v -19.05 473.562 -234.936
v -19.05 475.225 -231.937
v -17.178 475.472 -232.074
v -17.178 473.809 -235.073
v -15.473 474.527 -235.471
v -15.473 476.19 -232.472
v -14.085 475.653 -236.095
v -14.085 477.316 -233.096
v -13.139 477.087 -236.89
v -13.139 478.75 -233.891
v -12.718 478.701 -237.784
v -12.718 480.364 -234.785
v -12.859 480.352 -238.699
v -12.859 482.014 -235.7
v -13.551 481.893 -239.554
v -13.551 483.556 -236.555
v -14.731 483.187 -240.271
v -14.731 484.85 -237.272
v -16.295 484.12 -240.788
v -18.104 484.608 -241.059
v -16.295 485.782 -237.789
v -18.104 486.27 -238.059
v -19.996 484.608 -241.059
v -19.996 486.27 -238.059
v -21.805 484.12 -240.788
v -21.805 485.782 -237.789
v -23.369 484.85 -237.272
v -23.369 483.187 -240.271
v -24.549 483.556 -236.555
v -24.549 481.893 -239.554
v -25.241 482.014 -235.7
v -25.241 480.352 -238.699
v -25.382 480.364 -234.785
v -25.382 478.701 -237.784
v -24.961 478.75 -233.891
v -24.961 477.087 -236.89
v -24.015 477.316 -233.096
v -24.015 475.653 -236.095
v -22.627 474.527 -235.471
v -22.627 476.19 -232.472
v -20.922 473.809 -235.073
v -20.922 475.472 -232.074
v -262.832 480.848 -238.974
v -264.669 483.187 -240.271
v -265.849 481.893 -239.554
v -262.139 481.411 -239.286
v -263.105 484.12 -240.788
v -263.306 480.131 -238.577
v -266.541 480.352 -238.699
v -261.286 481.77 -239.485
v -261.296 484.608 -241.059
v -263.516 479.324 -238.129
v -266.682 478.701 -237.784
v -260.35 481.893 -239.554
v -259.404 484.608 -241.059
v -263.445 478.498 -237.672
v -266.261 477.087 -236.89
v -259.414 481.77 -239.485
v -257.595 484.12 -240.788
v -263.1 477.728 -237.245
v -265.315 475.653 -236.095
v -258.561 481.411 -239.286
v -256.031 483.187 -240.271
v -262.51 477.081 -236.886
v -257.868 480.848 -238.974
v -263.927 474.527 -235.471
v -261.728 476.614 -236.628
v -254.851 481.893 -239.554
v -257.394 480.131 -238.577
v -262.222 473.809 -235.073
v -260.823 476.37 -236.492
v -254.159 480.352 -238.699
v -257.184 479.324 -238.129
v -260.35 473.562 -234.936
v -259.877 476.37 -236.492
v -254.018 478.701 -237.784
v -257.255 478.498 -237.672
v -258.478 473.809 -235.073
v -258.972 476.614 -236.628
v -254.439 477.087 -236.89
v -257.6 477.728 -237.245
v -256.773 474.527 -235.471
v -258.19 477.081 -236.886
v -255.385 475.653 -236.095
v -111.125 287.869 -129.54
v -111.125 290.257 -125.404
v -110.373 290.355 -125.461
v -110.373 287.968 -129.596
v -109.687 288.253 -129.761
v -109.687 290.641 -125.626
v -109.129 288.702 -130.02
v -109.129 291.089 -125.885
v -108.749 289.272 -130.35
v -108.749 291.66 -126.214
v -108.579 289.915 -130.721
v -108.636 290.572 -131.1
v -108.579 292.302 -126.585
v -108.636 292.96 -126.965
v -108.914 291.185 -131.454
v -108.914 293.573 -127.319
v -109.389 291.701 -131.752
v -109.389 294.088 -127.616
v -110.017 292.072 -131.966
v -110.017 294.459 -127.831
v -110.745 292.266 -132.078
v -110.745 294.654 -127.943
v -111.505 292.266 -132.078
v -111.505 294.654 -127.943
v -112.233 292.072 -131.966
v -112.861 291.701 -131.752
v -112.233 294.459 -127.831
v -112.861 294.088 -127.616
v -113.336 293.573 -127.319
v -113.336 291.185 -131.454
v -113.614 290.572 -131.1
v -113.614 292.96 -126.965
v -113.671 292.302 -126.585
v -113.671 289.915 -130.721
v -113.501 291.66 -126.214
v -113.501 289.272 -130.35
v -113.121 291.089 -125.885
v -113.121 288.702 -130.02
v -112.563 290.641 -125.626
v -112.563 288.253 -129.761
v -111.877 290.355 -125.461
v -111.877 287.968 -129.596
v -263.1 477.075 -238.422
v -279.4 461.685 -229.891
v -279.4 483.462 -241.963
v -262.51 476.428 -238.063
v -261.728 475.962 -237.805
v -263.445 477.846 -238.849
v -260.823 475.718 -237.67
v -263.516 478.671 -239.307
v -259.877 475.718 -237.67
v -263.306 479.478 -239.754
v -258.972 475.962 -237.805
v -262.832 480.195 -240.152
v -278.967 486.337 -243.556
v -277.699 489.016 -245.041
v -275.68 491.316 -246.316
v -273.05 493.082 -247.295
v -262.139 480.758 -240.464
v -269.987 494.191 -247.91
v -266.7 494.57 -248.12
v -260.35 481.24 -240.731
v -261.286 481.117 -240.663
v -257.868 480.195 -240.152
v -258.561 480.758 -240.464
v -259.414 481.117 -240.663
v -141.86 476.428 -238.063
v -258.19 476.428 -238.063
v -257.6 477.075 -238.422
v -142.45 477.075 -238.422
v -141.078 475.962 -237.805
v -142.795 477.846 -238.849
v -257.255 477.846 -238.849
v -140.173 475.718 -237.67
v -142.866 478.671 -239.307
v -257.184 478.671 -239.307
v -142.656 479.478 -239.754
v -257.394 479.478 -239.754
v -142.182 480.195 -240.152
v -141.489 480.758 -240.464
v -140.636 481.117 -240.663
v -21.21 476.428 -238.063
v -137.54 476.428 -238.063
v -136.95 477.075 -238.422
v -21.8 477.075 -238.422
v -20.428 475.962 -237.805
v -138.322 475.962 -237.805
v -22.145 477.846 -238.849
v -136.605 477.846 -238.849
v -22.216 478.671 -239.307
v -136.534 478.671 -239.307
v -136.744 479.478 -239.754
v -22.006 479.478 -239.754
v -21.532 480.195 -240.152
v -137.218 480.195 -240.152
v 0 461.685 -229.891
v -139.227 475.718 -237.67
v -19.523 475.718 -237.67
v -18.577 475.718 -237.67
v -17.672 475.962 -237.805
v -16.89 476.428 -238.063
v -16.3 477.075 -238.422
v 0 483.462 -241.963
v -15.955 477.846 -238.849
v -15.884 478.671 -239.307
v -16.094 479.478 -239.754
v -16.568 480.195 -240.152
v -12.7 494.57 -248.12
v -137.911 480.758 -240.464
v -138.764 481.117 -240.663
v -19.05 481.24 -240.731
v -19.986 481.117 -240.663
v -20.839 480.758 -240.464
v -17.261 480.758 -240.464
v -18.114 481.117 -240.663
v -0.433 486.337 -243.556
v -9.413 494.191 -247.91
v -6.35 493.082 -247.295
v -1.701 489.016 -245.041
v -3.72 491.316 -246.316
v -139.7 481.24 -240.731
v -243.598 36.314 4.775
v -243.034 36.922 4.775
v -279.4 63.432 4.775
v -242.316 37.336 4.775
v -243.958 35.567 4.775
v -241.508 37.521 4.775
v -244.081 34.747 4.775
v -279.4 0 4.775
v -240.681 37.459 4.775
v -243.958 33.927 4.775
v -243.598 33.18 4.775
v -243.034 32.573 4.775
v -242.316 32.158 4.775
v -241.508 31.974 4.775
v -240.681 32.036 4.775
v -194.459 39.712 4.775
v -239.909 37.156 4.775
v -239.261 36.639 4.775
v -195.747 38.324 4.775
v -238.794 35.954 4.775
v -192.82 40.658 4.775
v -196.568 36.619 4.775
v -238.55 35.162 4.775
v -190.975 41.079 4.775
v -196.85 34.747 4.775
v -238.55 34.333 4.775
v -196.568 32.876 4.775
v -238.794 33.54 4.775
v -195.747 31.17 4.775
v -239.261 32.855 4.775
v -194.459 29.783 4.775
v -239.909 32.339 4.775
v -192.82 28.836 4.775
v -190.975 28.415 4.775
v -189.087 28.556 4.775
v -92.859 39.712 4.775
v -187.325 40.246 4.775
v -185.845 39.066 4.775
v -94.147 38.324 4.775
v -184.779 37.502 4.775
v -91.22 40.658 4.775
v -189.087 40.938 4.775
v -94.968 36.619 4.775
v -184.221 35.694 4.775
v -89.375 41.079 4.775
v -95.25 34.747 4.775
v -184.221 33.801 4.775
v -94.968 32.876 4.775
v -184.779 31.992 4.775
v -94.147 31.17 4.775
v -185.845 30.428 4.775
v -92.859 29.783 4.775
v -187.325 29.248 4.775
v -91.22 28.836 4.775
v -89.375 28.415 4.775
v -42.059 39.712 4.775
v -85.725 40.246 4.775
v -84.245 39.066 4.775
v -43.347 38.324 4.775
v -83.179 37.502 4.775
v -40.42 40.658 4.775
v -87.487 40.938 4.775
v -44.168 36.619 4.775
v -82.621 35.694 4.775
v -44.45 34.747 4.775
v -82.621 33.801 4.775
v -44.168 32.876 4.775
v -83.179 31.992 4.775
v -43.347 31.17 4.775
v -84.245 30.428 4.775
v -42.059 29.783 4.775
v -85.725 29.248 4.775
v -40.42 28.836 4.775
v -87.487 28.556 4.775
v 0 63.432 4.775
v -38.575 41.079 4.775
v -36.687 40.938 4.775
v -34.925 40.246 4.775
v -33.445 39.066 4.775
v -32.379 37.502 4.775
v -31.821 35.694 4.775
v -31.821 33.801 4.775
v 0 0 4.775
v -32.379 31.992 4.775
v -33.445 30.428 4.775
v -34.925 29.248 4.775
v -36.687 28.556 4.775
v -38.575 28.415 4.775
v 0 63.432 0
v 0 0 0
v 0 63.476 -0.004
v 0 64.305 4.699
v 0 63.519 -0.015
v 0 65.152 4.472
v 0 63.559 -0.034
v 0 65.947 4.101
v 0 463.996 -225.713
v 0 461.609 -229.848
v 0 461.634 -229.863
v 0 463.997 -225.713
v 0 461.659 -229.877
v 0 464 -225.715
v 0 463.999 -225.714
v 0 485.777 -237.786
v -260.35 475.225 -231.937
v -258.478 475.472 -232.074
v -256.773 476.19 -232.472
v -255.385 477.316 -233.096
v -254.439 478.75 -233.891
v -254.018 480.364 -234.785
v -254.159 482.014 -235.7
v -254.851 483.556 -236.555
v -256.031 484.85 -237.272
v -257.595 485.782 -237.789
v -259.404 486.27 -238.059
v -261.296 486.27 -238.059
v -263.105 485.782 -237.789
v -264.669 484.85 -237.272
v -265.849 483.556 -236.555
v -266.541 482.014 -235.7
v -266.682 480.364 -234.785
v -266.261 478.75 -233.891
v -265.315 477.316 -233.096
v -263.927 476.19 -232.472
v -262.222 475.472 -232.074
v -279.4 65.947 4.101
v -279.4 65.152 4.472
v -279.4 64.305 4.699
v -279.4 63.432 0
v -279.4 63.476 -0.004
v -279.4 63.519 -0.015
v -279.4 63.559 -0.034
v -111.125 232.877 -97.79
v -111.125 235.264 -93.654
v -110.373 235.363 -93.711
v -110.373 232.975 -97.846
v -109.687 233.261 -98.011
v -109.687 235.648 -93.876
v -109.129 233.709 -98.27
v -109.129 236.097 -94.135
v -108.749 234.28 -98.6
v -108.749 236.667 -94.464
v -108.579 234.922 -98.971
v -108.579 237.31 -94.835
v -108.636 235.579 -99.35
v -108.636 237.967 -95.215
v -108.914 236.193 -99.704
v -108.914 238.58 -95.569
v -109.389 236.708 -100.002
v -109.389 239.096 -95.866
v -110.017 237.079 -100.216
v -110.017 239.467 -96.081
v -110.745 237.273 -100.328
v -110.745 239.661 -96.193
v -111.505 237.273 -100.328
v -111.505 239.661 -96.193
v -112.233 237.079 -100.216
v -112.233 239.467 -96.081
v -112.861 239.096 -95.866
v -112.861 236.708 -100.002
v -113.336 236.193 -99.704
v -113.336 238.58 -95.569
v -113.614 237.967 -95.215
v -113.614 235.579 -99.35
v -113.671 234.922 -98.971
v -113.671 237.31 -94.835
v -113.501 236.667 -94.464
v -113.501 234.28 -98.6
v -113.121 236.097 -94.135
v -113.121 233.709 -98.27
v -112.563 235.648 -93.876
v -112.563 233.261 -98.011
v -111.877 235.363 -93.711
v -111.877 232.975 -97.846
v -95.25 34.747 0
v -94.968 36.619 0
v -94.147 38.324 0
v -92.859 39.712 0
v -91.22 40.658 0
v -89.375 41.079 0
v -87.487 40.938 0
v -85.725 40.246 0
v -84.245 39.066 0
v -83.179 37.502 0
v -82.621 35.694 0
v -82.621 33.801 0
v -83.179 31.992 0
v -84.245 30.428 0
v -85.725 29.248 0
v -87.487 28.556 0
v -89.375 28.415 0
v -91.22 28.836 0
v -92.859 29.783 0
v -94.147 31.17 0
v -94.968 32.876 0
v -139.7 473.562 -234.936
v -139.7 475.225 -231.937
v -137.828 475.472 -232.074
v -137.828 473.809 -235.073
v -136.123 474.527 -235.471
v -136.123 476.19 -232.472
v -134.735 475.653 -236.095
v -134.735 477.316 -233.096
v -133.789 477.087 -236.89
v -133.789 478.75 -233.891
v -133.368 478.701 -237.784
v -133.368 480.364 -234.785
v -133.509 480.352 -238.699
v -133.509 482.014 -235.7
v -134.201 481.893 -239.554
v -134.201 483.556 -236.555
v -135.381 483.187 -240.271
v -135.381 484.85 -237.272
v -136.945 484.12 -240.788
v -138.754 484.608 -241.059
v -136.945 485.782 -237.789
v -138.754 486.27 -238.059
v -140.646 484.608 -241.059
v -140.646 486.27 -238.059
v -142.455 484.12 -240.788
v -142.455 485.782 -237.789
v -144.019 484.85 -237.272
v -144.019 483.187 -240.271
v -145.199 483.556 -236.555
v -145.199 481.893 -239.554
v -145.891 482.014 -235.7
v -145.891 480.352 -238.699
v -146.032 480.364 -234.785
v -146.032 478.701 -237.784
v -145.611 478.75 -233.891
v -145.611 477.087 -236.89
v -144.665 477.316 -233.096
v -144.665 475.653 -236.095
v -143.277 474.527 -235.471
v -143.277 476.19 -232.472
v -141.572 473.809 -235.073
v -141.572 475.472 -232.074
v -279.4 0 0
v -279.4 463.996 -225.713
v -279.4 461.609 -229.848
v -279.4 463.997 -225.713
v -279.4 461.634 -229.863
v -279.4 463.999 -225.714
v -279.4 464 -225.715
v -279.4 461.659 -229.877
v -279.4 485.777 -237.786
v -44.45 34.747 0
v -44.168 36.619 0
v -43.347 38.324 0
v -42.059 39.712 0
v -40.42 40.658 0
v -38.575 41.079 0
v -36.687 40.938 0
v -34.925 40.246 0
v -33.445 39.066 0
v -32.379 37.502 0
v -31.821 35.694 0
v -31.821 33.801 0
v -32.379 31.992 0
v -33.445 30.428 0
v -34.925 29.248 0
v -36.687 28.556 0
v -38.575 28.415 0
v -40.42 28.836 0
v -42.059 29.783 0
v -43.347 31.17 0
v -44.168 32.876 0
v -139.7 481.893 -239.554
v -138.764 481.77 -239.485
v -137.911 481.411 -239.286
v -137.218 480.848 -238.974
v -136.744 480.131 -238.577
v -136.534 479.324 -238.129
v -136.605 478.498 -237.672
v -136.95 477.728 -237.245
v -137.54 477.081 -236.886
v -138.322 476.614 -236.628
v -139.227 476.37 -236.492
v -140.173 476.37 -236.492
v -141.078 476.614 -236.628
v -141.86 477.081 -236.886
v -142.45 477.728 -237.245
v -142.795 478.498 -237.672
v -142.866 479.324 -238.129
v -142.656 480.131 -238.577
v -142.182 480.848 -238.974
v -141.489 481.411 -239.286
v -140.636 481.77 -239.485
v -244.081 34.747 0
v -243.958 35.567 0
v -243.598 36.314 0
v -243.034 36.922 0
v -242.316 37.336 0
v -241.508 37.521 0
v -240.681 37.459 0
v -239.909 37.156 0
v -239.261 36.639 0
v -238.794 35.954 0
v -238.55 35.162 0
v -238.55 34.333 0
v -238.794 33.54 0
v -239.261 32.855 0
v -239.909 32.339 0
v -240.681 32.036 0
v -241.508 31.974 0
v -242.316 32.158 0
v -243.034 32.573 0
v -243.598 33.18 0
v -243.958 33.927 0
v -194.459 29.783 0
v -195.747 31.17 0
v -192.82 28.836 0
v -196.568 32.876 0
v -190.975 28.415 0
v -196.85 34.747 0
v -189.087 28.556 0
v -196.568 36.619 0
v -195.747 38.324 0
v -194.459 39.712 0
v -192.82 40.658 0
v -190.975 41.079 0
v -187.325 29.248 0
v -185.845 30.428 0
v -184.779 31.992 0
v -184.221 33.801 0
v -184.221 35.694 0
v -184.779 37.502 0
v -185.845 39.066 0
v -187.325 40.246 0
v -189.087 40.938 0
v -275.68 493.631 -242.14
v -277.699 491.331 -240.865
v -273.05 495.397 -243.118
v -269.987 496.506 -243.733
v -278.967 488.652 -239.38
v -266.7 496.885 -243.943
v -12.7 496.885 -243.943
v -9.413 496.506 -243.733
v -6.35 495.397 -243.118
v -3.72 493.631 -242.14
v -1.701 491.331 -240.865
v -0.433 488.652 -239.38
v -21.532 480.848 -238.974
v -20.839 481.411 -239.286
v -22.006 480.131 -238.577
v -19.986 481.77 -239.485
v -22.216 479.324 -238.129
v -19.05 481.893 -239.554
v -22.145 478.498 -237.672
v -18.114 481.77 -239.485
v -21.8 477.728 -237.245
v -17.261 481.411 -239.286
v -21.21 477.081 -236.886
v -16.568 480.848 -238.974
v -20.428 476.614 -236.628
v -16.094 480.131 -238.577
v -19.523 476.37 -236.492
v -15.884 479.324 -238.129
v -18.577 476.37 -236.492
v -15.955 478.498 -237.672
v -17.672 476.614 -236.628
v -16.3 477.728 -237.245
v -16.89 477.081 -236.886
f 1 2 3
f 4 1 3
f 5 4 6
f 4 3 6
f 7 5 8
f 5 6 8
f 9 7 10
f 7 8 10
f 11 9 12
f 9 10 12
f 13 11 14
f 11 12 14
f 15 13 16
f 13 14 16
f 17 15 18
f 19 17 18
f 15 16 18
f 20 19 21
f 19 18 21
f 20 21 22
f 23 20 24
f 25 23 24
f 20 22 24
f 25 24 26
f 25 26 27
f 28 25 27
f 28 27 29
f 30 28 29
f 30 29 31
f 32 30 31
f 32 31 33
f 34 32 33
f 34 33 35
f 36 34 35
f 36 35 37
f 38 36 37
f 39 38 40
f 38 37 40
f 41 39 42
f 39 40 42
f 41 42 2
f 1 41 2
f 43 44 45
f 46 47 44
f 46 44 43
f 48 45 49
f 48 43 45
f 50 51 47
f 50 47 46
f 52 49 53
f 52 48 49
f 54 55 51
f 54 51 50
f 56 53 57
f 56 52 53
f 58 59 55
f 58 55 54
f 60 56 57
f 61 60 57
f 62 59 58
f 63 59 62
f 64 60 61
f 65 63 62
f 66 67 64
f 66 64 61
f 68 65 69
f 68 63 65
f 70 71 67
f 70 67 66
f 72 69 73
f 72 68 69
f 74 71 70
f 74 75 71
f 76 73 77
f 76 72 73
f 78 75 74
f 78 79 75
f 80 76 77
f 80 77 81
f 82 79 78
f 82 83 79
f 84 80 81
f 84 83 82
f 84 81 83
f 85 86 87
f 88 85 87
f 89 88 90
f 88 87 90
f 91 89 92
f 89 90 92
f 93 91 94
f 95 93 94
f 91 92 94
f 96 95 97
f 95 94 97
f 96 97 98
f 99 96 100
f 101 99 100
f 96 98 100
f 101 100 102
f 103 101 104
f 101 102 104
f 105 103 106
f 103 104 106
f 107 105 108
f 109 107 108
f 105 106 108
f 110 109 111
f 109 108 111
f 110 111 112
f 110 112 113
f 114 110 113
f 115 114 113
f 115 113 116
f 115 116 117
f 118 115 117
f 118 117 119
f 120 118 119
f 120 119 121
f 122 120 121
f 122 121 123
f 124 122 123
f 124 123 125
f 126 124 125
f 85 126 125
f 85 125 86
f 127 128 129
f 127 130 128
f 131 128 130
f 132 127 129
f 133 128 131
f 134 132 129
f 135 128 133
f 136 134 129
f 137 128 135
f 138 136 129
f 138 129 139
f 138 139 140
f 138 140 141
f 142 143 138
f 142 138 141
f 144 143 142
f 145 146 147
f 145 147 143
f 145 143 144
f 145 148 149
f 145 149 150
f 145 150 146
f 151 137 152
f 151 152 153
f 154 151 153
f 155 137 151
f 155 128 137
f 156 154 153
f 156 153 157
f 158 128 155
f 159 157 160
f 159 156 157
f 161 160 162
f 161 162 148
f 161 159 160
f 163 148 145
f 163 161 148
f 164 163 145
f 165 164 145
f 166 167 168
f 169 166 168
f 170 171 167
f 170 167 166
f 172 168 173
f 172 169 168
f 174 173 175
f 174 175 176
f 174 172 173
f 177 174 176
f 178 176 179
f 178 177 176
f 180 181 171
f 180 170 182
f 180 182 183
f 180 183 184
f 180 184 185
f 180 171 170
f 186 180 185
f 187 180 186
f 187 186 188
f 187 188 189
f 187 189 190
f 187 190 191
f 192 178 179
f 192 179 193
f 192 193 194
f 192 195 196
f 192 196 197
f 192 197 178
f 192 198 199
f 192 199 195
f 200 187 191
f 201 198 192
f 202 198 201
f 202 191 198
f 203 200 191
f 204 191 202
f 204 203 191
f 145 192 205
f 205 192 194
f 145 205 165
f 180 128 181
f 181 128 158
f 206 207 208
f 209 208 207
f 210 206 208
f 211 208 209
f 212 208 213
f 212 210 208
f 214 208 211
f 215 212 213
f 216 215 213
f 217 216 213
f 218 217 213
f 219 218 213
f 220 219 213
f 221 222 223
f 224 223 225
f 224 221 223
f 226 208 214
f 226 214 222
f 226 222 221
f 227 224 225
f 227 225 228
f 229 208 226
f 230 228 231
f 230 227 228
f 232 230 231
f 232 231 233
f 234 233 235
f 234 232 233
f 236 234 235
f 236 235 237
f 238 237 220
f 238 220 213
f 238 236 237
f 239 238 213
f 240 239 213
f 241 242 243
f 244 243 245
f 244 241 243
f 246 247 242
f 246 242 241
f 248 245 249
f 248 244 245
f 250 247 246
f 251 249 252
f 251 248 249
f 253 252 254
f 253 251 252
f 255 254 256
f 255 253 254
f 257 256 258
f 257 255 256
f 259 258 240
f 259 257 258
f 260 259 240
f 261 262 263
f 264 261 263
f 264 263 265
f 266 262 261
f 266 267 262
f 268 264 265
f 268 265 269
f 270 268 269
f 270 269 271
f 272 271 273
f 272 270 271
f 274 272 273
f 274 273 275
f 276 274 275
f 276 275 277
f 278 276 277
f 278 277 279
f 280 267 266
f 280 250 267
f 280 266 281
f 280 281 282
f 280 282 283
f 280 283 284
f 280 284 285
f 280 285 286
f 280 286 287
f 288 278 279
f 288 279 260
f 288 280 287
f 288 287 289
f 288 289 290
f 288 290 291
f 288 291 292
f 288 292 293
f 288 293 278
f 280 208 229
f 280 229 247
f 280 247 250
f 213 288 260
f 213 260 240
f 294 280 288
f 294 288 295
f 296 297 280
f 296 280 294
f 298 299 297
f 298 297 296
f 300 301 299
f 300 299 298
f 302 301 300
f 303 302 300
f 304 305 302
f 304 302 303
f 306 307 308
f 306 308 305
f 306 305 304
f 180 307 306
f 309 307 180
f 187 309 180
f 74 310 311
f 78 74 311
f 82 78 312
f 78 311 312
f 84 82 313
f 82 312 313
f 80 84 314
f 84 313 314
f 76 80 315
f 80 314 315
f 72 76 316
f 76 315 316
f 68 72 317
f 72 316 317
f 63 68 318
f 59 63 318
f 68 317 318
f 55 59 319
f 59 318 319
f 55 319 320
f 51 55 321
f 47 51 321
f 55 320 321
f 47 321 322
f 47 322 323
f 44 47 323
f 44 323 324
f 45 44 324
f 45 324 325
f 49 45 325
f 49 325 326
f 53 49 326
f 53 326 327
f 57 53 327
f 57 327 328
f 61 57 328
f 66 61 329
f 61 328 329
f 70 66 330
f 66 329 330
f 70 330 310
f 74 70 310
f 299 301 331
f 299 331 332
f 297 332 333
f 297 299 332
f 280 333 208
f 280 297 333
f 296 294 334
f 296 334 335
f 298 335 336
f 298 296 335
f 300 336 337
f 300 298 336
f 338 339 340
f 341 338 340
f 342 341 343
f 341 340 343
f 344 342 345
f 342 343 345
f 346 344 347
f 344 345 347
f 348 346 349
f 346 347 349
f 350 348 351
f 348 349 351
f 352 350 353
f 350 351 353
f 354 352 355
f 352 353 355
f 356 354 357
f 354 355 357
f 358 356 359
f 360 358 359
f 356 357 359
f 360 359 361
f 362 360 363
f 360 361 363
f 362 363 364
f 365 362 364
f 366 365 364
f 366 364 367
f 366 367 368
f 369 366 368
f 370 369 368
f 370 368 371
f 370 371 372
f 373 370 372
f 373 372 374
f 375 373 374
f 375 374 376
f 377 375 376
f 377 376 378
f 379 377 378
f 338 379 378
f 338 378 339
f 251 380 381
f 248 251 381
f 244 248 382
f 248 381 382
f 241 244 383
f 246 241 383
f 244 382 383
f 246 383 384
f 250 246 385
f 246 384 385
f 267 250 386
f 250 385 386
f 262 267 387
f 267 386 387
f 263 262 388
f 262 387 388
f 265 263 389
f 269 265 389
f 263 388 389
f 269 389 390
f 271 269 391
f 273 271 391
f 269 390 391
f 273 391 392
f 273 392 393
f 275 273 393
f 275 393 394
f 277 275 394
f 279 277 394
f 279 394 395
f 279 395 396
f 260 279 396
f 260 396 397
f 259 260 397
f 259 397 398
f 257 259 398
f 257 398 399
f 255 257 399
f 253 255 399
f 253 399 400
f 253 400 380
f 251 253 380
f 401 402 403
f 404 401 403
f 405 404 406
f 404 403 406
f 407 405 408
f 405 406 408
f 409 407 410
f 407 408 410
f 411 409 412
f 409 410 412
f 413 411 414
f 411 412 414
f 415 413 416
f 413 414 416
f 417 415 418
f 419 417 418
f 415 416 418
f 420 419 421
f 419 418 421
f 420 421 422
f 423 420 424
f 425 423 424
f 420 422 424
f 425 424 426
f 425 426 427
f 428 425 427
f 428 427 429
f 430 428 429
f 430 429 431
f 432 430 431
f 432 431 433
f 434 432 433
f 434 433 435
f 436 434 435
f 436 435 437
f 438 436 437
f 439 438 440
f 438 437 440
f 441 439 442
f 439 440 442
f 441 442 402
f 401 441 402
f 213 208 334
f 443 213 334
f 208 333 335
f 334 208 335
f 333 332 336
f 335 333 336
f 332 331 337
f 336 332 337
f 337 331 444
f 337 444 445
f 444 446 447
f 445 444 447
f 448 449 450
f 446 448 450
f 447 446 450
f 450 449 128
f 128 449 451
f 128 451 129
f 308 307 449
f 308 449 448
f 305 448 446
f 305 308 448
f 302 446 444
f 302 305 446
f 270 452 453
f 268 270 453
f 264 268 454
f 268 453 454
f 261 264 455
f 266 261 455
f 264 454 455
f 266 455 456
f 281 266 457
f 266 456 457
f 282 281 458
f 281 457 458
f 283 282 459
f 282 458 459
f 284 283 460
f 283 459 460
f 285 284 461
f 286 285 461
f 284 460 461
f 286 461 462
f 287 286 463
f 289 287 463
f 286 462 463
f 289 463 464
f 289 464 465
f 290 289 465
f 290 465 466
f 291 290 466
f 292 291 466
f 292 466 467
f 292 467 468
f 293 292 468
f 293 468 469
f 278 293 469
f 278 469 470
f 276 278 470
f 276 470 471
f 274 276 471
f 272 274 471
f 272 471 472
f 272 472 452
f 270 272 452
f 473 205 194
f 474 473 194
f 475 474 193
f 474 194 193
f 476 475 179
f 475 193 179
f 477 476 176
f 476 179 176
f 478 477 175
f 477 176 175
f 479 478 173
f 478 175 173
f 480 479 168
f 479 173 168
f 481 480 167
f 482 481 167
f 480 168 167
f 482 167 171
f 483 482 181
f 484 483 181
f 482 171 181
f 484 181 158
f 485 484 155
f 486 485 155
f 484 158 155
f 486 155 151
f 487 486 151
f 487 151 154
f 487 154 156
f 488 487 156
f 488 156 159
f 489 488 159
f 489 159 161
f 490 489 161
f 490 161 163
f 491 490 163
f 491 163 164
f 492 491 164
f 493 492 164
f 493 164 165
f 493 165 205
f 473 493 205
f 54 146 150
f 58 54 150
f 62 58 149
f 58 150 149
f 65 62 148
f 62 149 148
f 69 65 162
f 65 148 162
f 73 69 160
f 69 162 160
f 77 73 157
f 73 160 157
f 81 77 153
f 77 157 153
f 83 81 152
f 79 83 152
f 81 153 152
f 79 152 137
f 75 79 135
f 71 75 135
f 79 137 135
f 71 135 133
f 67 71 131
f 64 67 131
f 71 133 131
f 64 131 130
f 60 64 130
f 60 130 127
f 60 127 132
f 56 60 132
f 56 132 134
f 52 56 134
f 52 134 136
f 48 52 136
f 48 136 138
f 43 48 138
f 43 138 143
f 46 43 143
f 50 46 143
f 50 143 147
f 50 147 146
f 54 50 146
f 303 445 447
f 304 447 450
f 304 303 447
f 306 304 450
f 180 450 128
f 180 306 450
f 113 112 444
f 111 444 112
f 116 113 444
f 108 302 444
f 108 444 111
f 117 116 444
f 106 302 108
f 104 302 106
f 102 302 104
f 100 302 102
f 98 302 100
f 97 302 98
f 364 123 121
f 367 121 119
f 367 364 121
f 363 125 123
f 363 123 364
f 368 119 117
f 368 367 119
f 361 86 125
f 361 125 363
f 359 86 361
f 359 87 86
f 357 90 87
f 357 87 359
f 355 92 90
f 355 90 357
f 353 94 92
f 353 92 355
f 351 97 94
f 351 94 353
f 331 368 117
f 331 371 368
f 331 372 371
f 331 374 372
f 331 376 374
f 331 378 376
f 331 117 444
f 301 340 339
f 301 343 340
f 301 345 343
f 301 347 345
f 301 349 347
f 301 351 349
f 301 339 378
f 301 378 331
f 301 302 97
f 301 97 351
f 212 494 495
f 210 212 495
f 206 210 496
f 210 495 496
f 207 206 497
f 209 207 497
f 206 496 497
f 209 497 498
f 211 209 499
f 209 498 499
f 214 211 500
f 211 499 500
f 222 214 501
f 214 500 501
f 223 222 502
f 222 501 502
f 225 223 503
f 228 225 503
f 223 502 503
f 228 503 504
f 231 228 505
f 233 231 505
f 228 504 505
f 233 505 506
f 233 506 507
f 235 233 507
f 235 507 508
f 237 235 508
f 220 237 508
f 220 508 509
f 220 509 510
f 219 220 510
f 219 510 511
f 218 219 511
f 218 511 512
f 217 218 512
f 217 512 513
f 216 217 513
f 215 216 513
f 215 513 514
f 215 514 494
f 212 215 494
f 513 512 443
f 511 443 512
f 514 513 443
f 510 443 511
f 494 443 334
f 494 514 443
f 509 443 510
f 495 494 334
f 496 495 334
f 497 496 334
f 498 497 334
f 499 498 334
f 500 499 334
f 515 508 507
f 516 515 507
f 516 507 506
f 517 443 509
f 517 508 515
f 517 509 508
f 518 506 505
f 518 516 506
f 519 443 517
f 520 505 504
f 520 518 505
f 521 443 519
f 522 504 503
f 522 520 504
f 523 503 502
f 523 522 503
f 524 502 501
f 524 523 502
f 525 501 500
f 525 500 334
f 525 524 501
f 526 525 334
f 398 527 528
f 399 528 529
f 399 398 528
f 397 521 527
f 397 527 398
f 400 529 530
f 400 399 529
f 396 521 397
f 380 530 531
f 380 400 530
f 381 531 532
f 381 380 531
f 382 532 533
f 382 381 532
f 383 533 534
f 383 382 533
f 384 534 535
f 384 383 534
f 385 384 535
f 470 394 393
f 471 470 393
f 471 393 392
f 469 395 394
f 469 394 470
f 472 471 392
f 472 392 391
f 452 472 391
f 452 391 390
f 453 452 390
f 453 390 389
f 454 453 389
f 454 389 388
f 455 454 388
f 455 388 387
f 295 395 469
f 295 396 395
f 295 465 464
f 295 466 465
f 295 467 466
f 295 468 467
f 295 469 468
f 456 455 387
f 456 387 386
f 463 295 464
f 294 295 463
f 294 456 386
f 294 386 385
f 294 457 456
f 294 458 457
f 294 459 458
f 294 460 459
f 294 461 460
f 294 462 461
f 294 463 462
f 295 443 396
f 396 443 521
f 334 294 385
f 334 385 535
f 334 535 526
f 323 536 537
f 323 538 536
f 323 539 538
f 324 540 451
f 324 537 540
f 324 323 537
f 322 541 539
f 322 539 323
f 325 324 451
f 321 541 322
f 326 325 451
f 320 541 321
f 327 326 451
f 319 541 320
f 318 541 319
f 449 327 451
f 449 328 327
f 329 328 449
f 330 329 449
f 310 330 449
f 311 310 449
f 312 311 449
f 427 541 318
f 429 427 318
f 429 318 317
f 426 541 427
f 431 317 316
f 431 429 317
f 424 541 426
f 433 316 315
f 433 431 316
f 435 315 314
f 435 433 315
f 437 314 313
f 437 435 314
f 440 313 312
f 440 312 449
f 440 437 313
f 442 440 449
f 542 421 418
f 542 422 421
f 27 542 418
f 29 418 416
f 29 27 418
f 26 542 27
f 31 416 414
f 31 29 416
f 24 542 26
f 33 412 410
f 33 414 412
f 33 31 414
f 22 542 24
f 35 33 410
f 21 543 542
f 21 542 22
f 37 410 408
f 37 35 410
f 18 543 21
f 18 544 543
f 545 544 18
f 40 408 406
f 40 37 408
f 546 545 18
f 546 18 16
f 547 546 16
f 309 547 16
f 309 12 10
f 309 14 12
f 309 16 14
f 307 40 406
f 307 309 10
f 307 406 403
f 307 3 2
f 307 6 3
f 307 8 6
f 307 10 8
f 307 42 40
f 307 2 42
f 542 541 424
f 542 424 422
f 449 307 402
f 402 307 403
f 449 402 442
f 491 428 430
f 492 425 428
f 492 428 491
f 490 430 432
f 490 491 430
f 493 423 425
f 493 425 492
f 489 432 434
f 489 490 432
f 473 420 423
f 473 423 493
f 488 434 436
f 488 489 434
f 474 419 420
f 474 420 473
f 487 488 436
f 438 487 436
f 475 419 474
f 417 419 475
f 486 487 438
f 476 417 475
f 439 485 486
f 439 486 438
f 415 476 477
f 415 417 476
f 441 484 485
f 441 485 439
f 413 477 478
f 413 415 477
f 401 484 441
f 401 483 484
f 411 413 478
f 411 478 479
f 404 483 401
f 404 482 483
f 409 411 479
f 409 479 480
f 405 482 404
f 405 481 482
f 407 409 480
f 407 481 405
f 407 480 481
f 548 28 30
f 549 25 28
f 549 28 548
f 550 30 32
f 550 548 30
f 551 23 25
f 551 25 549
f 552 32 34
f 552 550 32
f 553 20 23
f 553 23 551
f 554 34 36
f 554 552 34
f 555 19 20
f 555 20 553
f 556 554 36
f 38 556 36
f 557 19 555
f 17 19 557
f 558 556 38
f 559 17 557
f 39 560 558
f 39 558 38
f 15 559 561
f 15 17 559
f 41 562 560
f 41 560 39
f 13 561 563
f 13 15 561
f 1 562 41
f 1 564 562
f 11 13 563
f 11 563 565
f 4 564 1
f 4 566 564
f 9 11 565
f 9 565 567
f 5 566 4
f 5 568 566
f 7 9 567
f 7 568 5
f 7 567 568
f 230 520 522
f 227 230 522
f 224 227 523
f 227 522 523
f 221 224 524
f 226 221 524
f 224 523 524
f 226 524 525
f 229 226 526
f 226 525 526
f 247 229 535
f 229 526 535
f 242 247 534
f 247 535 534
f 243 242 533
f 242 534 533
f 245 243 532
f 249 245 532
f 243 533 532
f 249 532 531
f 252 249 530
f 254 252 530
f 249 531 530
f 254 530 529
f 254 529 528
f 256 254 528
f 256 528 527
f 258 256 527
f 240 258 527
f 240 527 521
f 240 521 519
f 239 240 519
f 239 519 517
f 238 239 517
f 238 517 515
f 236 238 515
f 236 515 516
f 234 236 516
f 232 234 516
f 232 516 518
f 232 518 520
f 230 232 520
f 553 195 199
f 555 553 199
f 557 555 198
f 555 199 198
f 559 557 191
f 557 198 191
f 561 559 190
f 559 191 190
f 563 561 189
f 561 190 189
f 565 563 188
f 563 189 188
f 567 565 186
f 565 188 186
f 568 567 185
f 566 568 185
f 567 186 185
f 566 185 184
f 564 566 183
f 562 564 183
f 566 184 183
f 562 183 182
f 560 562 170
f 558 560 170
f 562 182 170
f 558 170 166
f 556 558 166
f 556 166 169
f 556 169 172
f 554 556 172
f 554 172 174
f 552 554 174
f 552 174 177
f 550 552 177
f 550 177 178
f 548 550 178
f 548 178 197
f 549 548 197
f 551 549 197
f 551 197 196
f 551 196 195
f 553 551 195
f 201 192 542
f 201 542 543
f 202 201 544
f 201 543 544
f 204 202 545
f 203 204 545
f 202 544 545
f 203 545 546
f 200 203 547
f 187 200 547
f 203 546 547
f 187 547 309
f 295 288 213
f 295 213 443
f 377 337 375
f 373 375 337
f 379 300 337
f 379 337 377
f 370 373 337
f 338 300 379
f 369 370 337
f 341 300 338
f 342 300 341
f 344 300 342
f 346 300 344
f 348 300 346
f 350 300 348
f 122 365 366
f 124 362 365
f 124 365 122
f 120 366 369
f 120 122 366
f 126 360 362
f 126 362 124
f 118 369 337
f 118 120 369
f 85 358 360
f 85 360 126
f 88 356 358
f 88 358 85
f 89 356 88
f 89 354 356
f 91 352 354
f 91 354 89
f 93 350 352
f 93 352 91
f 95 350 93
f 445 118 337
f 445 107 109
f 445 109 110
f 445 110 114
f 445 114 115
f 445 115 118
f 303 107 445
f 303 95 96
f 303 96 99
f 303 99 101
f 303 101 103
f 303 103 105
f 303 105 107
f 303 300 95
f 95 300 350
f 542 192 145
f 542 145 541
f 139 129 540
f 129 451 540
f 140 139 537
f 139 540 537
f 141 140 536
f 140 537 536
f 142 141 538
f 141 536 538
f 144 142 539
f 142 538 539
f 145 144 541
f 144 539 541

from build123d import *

# Parameters (mm, degrees)
BASE_FLANGE1_DEPTH = 279.4
SKETCH4_R          = 3.175
TAB1_DEPTH         = 4.7752
SKETCH4_2_R        = 3.175
CUT_EXTRUDE1_DEPTH = 7.62
SKETCH5_R          = 6.35
SKETCH5_R_2        = 2.7813
CUT_EXTRUDE2_DEPTH = 10.16
SKETCH6_R          = 6.35
CUT_EXTRUDE3_DEPTH = 3.429
FILLET1_R          = 12.7
FILLET2_R          = 12.7
SKETCH7_R          = 2.5527
CUT_EXTRUDE4_DEPTH = 7.62


# Sheet-metal steps are written as plain solids
with BuildPart() as part:
    # Sketch1 → Base-Flange1 (new body)
    with BuildSketch(Plane(origin=(0, 0, 0), x_dir=(0, 0, -1), z_dir=(1, 0, 0))):
        with BuildLine():
            Line((0, 0), (0, 63.431940905))
            ThreePointArc((0, 63.431940905), (0.00865484, 63.497680943), (0.034029547, 63.558940905))
            Line((0.034029547, 63.558940905), (229.848055418, 461.608510005))
            ThreePointArc((229.848055418, 461.608510005), (229.869833323, 461.646613437), (229.891277889, 461.684905463))
            Line((229.891277889, 461.684905463), (248.119591573, 494.569653848))
            Line((248.119591573, 494.569653848), (243.943107547, 496.884716746))
            Line((243.943107547, 496.884716746), (225.714793821, 463.999968287))
            ThreePointArc((225.714793821, 463.999968287), (225.713710761, 463.998034347), (225.712610867, 463.996109931))
            Line((225.712610867, 463.996109931), (-4.101414961, 65.946540905))
            ThreePointArc((-4.101414961, 65.946540905), (-4.603834166, 64.733593647), (-4.7752, 63.431940905))
            Line((-4.7752, 63.431940905), (-4.7752, 0))
            Line((-4.7752, 0), (0, 0))
        make_face()
    extrude(amount=-BASE_FLANGE1_DEPTH)

    # Sketch4 → Tab1 (add)
    with BuildSketch(Plane(origin=(0, 11.035159758, 19.907955191), x_dir=(-1, 0, 0), z_dir=(0, -0.48480962024634994, -0.8746197071393886))):
        with Locations((19.05, 534.436130775)):
            Circle(SKETCH4_R)
        with Locations((139.7, 534.436130775)):
            Circle(SKETCH4_R)
        with Locations((260.35, 534.436130775)):
            Circle(SKETCH4_R)
    extrude(amount=-TAB1_DEPTH)

    # Sketch4<2> → Cut-Extrude1 (cut)
    with BuildSketch(Plane(origin=(0, 11.035159758, 19.907955191), x_dir=(-1, 0, 0), z_dir=(0, -0.48480962024634994, -0.8746197071393886))):
        with Locations(Location((19.05, 534.436130775, 0), (0, 0, 90))):
            Circle(SKETCH4_2_R)
        with Locations(Location((139.7, 534.436130775, 0), (0, 0, 90))):
            Circle(SKETCH4_2_R)
        with Locations(Location((260.35, 534.436130775, 0), (0, 0, 90))):
            Circle(SKETCH4_2_R)
    extrude(amount=-CUT_EXTRUDE1_DEPTH, mode=Mode.SUBTRACT)

    # Sketch5 → Cut-Extrude2 (cut)
    with BuildSketch(Plane(origin=(0, 0, 0), x_dir=(-1, 0, 0), z_dir=(0, 0, -1))):
        with Locations((38.1, 34.7472)):
            Circle(SKETCH5_R)
        with Locations((88.9, 34.7472)):
            Circle(SKETCH5_R)
        with Locations((190.5, 34.7472)):
            Circle(SKETCH5_R)
        with Locations((241.3, 34.7472)):
            Circle(SKETCH5_R_2)
    extrude(amount=-CUT_EXTRUDE2_DEPTH, mode=Mode.SUBTRACT)

    # Sketch6 → Cut-Extrude3 (cut)
    with BuildSketch(Plane(origin=(0, 13.350222657, 24.084439216), x_dir=(1, 0, 0), z_dir=(0, 0.48480962024634877, 0.8746197071393893))):
        with Locations(Location((-260.35, 534.436130775, 0), (0, 0, 270))):
            Circle(SKETCH6_R)
        with Locations(Location((-139.7, 534.436130775, 0), (0, 0, 270))):
            Circle(SKETCH6_R)
        with Locations(Location((-19.05, 534.436130775, 0), (0, 0, 270))):
            Circle(SKETCH6_R)
    extrude(amount=-CUT_EXTRUDE3_DEPTH, mode=Mode.SUBTRACT)

    # Fillet1
    fillet1_edges = [part.edges().sort_by_distance(p)[0] for p in [
        (-279.4, 495.727185297, -246.03134956),
    ]]
    fillet(fillet1_edges, radius=FILLET1_R)

    # Fillet2
    fillet2_edges = [part.edges().sort_by_distance(p)[0] for p in [
        (0, 495.727185297, -246.03134956),
    ]]
    fillet(fillet2_edges, radius=FILLET2_R)

    # Sketch7 → Cut-Extrude4 (cut)
    with BuildSketch(Plane(origin=(0, 18.2626, 31.631751078), x_dir=(1, 0, 0), z_dir=(0, 0.5000000000000011, 0.8660254037844382))):
        with Locations(Location((-111.125, 316.624698106, 0), (0, 0, 270))):
            Circle(SKETCH7_R)
        with Locations(Location((-111.125, 253.124698106, 0), (0, 0, 270))):
            Circle(SKETCH7_R)
    extrude(amount=-CUT_EXTRUDE4_DEPTH, mode=Mode.SUBTRACT)


solid = part.part
